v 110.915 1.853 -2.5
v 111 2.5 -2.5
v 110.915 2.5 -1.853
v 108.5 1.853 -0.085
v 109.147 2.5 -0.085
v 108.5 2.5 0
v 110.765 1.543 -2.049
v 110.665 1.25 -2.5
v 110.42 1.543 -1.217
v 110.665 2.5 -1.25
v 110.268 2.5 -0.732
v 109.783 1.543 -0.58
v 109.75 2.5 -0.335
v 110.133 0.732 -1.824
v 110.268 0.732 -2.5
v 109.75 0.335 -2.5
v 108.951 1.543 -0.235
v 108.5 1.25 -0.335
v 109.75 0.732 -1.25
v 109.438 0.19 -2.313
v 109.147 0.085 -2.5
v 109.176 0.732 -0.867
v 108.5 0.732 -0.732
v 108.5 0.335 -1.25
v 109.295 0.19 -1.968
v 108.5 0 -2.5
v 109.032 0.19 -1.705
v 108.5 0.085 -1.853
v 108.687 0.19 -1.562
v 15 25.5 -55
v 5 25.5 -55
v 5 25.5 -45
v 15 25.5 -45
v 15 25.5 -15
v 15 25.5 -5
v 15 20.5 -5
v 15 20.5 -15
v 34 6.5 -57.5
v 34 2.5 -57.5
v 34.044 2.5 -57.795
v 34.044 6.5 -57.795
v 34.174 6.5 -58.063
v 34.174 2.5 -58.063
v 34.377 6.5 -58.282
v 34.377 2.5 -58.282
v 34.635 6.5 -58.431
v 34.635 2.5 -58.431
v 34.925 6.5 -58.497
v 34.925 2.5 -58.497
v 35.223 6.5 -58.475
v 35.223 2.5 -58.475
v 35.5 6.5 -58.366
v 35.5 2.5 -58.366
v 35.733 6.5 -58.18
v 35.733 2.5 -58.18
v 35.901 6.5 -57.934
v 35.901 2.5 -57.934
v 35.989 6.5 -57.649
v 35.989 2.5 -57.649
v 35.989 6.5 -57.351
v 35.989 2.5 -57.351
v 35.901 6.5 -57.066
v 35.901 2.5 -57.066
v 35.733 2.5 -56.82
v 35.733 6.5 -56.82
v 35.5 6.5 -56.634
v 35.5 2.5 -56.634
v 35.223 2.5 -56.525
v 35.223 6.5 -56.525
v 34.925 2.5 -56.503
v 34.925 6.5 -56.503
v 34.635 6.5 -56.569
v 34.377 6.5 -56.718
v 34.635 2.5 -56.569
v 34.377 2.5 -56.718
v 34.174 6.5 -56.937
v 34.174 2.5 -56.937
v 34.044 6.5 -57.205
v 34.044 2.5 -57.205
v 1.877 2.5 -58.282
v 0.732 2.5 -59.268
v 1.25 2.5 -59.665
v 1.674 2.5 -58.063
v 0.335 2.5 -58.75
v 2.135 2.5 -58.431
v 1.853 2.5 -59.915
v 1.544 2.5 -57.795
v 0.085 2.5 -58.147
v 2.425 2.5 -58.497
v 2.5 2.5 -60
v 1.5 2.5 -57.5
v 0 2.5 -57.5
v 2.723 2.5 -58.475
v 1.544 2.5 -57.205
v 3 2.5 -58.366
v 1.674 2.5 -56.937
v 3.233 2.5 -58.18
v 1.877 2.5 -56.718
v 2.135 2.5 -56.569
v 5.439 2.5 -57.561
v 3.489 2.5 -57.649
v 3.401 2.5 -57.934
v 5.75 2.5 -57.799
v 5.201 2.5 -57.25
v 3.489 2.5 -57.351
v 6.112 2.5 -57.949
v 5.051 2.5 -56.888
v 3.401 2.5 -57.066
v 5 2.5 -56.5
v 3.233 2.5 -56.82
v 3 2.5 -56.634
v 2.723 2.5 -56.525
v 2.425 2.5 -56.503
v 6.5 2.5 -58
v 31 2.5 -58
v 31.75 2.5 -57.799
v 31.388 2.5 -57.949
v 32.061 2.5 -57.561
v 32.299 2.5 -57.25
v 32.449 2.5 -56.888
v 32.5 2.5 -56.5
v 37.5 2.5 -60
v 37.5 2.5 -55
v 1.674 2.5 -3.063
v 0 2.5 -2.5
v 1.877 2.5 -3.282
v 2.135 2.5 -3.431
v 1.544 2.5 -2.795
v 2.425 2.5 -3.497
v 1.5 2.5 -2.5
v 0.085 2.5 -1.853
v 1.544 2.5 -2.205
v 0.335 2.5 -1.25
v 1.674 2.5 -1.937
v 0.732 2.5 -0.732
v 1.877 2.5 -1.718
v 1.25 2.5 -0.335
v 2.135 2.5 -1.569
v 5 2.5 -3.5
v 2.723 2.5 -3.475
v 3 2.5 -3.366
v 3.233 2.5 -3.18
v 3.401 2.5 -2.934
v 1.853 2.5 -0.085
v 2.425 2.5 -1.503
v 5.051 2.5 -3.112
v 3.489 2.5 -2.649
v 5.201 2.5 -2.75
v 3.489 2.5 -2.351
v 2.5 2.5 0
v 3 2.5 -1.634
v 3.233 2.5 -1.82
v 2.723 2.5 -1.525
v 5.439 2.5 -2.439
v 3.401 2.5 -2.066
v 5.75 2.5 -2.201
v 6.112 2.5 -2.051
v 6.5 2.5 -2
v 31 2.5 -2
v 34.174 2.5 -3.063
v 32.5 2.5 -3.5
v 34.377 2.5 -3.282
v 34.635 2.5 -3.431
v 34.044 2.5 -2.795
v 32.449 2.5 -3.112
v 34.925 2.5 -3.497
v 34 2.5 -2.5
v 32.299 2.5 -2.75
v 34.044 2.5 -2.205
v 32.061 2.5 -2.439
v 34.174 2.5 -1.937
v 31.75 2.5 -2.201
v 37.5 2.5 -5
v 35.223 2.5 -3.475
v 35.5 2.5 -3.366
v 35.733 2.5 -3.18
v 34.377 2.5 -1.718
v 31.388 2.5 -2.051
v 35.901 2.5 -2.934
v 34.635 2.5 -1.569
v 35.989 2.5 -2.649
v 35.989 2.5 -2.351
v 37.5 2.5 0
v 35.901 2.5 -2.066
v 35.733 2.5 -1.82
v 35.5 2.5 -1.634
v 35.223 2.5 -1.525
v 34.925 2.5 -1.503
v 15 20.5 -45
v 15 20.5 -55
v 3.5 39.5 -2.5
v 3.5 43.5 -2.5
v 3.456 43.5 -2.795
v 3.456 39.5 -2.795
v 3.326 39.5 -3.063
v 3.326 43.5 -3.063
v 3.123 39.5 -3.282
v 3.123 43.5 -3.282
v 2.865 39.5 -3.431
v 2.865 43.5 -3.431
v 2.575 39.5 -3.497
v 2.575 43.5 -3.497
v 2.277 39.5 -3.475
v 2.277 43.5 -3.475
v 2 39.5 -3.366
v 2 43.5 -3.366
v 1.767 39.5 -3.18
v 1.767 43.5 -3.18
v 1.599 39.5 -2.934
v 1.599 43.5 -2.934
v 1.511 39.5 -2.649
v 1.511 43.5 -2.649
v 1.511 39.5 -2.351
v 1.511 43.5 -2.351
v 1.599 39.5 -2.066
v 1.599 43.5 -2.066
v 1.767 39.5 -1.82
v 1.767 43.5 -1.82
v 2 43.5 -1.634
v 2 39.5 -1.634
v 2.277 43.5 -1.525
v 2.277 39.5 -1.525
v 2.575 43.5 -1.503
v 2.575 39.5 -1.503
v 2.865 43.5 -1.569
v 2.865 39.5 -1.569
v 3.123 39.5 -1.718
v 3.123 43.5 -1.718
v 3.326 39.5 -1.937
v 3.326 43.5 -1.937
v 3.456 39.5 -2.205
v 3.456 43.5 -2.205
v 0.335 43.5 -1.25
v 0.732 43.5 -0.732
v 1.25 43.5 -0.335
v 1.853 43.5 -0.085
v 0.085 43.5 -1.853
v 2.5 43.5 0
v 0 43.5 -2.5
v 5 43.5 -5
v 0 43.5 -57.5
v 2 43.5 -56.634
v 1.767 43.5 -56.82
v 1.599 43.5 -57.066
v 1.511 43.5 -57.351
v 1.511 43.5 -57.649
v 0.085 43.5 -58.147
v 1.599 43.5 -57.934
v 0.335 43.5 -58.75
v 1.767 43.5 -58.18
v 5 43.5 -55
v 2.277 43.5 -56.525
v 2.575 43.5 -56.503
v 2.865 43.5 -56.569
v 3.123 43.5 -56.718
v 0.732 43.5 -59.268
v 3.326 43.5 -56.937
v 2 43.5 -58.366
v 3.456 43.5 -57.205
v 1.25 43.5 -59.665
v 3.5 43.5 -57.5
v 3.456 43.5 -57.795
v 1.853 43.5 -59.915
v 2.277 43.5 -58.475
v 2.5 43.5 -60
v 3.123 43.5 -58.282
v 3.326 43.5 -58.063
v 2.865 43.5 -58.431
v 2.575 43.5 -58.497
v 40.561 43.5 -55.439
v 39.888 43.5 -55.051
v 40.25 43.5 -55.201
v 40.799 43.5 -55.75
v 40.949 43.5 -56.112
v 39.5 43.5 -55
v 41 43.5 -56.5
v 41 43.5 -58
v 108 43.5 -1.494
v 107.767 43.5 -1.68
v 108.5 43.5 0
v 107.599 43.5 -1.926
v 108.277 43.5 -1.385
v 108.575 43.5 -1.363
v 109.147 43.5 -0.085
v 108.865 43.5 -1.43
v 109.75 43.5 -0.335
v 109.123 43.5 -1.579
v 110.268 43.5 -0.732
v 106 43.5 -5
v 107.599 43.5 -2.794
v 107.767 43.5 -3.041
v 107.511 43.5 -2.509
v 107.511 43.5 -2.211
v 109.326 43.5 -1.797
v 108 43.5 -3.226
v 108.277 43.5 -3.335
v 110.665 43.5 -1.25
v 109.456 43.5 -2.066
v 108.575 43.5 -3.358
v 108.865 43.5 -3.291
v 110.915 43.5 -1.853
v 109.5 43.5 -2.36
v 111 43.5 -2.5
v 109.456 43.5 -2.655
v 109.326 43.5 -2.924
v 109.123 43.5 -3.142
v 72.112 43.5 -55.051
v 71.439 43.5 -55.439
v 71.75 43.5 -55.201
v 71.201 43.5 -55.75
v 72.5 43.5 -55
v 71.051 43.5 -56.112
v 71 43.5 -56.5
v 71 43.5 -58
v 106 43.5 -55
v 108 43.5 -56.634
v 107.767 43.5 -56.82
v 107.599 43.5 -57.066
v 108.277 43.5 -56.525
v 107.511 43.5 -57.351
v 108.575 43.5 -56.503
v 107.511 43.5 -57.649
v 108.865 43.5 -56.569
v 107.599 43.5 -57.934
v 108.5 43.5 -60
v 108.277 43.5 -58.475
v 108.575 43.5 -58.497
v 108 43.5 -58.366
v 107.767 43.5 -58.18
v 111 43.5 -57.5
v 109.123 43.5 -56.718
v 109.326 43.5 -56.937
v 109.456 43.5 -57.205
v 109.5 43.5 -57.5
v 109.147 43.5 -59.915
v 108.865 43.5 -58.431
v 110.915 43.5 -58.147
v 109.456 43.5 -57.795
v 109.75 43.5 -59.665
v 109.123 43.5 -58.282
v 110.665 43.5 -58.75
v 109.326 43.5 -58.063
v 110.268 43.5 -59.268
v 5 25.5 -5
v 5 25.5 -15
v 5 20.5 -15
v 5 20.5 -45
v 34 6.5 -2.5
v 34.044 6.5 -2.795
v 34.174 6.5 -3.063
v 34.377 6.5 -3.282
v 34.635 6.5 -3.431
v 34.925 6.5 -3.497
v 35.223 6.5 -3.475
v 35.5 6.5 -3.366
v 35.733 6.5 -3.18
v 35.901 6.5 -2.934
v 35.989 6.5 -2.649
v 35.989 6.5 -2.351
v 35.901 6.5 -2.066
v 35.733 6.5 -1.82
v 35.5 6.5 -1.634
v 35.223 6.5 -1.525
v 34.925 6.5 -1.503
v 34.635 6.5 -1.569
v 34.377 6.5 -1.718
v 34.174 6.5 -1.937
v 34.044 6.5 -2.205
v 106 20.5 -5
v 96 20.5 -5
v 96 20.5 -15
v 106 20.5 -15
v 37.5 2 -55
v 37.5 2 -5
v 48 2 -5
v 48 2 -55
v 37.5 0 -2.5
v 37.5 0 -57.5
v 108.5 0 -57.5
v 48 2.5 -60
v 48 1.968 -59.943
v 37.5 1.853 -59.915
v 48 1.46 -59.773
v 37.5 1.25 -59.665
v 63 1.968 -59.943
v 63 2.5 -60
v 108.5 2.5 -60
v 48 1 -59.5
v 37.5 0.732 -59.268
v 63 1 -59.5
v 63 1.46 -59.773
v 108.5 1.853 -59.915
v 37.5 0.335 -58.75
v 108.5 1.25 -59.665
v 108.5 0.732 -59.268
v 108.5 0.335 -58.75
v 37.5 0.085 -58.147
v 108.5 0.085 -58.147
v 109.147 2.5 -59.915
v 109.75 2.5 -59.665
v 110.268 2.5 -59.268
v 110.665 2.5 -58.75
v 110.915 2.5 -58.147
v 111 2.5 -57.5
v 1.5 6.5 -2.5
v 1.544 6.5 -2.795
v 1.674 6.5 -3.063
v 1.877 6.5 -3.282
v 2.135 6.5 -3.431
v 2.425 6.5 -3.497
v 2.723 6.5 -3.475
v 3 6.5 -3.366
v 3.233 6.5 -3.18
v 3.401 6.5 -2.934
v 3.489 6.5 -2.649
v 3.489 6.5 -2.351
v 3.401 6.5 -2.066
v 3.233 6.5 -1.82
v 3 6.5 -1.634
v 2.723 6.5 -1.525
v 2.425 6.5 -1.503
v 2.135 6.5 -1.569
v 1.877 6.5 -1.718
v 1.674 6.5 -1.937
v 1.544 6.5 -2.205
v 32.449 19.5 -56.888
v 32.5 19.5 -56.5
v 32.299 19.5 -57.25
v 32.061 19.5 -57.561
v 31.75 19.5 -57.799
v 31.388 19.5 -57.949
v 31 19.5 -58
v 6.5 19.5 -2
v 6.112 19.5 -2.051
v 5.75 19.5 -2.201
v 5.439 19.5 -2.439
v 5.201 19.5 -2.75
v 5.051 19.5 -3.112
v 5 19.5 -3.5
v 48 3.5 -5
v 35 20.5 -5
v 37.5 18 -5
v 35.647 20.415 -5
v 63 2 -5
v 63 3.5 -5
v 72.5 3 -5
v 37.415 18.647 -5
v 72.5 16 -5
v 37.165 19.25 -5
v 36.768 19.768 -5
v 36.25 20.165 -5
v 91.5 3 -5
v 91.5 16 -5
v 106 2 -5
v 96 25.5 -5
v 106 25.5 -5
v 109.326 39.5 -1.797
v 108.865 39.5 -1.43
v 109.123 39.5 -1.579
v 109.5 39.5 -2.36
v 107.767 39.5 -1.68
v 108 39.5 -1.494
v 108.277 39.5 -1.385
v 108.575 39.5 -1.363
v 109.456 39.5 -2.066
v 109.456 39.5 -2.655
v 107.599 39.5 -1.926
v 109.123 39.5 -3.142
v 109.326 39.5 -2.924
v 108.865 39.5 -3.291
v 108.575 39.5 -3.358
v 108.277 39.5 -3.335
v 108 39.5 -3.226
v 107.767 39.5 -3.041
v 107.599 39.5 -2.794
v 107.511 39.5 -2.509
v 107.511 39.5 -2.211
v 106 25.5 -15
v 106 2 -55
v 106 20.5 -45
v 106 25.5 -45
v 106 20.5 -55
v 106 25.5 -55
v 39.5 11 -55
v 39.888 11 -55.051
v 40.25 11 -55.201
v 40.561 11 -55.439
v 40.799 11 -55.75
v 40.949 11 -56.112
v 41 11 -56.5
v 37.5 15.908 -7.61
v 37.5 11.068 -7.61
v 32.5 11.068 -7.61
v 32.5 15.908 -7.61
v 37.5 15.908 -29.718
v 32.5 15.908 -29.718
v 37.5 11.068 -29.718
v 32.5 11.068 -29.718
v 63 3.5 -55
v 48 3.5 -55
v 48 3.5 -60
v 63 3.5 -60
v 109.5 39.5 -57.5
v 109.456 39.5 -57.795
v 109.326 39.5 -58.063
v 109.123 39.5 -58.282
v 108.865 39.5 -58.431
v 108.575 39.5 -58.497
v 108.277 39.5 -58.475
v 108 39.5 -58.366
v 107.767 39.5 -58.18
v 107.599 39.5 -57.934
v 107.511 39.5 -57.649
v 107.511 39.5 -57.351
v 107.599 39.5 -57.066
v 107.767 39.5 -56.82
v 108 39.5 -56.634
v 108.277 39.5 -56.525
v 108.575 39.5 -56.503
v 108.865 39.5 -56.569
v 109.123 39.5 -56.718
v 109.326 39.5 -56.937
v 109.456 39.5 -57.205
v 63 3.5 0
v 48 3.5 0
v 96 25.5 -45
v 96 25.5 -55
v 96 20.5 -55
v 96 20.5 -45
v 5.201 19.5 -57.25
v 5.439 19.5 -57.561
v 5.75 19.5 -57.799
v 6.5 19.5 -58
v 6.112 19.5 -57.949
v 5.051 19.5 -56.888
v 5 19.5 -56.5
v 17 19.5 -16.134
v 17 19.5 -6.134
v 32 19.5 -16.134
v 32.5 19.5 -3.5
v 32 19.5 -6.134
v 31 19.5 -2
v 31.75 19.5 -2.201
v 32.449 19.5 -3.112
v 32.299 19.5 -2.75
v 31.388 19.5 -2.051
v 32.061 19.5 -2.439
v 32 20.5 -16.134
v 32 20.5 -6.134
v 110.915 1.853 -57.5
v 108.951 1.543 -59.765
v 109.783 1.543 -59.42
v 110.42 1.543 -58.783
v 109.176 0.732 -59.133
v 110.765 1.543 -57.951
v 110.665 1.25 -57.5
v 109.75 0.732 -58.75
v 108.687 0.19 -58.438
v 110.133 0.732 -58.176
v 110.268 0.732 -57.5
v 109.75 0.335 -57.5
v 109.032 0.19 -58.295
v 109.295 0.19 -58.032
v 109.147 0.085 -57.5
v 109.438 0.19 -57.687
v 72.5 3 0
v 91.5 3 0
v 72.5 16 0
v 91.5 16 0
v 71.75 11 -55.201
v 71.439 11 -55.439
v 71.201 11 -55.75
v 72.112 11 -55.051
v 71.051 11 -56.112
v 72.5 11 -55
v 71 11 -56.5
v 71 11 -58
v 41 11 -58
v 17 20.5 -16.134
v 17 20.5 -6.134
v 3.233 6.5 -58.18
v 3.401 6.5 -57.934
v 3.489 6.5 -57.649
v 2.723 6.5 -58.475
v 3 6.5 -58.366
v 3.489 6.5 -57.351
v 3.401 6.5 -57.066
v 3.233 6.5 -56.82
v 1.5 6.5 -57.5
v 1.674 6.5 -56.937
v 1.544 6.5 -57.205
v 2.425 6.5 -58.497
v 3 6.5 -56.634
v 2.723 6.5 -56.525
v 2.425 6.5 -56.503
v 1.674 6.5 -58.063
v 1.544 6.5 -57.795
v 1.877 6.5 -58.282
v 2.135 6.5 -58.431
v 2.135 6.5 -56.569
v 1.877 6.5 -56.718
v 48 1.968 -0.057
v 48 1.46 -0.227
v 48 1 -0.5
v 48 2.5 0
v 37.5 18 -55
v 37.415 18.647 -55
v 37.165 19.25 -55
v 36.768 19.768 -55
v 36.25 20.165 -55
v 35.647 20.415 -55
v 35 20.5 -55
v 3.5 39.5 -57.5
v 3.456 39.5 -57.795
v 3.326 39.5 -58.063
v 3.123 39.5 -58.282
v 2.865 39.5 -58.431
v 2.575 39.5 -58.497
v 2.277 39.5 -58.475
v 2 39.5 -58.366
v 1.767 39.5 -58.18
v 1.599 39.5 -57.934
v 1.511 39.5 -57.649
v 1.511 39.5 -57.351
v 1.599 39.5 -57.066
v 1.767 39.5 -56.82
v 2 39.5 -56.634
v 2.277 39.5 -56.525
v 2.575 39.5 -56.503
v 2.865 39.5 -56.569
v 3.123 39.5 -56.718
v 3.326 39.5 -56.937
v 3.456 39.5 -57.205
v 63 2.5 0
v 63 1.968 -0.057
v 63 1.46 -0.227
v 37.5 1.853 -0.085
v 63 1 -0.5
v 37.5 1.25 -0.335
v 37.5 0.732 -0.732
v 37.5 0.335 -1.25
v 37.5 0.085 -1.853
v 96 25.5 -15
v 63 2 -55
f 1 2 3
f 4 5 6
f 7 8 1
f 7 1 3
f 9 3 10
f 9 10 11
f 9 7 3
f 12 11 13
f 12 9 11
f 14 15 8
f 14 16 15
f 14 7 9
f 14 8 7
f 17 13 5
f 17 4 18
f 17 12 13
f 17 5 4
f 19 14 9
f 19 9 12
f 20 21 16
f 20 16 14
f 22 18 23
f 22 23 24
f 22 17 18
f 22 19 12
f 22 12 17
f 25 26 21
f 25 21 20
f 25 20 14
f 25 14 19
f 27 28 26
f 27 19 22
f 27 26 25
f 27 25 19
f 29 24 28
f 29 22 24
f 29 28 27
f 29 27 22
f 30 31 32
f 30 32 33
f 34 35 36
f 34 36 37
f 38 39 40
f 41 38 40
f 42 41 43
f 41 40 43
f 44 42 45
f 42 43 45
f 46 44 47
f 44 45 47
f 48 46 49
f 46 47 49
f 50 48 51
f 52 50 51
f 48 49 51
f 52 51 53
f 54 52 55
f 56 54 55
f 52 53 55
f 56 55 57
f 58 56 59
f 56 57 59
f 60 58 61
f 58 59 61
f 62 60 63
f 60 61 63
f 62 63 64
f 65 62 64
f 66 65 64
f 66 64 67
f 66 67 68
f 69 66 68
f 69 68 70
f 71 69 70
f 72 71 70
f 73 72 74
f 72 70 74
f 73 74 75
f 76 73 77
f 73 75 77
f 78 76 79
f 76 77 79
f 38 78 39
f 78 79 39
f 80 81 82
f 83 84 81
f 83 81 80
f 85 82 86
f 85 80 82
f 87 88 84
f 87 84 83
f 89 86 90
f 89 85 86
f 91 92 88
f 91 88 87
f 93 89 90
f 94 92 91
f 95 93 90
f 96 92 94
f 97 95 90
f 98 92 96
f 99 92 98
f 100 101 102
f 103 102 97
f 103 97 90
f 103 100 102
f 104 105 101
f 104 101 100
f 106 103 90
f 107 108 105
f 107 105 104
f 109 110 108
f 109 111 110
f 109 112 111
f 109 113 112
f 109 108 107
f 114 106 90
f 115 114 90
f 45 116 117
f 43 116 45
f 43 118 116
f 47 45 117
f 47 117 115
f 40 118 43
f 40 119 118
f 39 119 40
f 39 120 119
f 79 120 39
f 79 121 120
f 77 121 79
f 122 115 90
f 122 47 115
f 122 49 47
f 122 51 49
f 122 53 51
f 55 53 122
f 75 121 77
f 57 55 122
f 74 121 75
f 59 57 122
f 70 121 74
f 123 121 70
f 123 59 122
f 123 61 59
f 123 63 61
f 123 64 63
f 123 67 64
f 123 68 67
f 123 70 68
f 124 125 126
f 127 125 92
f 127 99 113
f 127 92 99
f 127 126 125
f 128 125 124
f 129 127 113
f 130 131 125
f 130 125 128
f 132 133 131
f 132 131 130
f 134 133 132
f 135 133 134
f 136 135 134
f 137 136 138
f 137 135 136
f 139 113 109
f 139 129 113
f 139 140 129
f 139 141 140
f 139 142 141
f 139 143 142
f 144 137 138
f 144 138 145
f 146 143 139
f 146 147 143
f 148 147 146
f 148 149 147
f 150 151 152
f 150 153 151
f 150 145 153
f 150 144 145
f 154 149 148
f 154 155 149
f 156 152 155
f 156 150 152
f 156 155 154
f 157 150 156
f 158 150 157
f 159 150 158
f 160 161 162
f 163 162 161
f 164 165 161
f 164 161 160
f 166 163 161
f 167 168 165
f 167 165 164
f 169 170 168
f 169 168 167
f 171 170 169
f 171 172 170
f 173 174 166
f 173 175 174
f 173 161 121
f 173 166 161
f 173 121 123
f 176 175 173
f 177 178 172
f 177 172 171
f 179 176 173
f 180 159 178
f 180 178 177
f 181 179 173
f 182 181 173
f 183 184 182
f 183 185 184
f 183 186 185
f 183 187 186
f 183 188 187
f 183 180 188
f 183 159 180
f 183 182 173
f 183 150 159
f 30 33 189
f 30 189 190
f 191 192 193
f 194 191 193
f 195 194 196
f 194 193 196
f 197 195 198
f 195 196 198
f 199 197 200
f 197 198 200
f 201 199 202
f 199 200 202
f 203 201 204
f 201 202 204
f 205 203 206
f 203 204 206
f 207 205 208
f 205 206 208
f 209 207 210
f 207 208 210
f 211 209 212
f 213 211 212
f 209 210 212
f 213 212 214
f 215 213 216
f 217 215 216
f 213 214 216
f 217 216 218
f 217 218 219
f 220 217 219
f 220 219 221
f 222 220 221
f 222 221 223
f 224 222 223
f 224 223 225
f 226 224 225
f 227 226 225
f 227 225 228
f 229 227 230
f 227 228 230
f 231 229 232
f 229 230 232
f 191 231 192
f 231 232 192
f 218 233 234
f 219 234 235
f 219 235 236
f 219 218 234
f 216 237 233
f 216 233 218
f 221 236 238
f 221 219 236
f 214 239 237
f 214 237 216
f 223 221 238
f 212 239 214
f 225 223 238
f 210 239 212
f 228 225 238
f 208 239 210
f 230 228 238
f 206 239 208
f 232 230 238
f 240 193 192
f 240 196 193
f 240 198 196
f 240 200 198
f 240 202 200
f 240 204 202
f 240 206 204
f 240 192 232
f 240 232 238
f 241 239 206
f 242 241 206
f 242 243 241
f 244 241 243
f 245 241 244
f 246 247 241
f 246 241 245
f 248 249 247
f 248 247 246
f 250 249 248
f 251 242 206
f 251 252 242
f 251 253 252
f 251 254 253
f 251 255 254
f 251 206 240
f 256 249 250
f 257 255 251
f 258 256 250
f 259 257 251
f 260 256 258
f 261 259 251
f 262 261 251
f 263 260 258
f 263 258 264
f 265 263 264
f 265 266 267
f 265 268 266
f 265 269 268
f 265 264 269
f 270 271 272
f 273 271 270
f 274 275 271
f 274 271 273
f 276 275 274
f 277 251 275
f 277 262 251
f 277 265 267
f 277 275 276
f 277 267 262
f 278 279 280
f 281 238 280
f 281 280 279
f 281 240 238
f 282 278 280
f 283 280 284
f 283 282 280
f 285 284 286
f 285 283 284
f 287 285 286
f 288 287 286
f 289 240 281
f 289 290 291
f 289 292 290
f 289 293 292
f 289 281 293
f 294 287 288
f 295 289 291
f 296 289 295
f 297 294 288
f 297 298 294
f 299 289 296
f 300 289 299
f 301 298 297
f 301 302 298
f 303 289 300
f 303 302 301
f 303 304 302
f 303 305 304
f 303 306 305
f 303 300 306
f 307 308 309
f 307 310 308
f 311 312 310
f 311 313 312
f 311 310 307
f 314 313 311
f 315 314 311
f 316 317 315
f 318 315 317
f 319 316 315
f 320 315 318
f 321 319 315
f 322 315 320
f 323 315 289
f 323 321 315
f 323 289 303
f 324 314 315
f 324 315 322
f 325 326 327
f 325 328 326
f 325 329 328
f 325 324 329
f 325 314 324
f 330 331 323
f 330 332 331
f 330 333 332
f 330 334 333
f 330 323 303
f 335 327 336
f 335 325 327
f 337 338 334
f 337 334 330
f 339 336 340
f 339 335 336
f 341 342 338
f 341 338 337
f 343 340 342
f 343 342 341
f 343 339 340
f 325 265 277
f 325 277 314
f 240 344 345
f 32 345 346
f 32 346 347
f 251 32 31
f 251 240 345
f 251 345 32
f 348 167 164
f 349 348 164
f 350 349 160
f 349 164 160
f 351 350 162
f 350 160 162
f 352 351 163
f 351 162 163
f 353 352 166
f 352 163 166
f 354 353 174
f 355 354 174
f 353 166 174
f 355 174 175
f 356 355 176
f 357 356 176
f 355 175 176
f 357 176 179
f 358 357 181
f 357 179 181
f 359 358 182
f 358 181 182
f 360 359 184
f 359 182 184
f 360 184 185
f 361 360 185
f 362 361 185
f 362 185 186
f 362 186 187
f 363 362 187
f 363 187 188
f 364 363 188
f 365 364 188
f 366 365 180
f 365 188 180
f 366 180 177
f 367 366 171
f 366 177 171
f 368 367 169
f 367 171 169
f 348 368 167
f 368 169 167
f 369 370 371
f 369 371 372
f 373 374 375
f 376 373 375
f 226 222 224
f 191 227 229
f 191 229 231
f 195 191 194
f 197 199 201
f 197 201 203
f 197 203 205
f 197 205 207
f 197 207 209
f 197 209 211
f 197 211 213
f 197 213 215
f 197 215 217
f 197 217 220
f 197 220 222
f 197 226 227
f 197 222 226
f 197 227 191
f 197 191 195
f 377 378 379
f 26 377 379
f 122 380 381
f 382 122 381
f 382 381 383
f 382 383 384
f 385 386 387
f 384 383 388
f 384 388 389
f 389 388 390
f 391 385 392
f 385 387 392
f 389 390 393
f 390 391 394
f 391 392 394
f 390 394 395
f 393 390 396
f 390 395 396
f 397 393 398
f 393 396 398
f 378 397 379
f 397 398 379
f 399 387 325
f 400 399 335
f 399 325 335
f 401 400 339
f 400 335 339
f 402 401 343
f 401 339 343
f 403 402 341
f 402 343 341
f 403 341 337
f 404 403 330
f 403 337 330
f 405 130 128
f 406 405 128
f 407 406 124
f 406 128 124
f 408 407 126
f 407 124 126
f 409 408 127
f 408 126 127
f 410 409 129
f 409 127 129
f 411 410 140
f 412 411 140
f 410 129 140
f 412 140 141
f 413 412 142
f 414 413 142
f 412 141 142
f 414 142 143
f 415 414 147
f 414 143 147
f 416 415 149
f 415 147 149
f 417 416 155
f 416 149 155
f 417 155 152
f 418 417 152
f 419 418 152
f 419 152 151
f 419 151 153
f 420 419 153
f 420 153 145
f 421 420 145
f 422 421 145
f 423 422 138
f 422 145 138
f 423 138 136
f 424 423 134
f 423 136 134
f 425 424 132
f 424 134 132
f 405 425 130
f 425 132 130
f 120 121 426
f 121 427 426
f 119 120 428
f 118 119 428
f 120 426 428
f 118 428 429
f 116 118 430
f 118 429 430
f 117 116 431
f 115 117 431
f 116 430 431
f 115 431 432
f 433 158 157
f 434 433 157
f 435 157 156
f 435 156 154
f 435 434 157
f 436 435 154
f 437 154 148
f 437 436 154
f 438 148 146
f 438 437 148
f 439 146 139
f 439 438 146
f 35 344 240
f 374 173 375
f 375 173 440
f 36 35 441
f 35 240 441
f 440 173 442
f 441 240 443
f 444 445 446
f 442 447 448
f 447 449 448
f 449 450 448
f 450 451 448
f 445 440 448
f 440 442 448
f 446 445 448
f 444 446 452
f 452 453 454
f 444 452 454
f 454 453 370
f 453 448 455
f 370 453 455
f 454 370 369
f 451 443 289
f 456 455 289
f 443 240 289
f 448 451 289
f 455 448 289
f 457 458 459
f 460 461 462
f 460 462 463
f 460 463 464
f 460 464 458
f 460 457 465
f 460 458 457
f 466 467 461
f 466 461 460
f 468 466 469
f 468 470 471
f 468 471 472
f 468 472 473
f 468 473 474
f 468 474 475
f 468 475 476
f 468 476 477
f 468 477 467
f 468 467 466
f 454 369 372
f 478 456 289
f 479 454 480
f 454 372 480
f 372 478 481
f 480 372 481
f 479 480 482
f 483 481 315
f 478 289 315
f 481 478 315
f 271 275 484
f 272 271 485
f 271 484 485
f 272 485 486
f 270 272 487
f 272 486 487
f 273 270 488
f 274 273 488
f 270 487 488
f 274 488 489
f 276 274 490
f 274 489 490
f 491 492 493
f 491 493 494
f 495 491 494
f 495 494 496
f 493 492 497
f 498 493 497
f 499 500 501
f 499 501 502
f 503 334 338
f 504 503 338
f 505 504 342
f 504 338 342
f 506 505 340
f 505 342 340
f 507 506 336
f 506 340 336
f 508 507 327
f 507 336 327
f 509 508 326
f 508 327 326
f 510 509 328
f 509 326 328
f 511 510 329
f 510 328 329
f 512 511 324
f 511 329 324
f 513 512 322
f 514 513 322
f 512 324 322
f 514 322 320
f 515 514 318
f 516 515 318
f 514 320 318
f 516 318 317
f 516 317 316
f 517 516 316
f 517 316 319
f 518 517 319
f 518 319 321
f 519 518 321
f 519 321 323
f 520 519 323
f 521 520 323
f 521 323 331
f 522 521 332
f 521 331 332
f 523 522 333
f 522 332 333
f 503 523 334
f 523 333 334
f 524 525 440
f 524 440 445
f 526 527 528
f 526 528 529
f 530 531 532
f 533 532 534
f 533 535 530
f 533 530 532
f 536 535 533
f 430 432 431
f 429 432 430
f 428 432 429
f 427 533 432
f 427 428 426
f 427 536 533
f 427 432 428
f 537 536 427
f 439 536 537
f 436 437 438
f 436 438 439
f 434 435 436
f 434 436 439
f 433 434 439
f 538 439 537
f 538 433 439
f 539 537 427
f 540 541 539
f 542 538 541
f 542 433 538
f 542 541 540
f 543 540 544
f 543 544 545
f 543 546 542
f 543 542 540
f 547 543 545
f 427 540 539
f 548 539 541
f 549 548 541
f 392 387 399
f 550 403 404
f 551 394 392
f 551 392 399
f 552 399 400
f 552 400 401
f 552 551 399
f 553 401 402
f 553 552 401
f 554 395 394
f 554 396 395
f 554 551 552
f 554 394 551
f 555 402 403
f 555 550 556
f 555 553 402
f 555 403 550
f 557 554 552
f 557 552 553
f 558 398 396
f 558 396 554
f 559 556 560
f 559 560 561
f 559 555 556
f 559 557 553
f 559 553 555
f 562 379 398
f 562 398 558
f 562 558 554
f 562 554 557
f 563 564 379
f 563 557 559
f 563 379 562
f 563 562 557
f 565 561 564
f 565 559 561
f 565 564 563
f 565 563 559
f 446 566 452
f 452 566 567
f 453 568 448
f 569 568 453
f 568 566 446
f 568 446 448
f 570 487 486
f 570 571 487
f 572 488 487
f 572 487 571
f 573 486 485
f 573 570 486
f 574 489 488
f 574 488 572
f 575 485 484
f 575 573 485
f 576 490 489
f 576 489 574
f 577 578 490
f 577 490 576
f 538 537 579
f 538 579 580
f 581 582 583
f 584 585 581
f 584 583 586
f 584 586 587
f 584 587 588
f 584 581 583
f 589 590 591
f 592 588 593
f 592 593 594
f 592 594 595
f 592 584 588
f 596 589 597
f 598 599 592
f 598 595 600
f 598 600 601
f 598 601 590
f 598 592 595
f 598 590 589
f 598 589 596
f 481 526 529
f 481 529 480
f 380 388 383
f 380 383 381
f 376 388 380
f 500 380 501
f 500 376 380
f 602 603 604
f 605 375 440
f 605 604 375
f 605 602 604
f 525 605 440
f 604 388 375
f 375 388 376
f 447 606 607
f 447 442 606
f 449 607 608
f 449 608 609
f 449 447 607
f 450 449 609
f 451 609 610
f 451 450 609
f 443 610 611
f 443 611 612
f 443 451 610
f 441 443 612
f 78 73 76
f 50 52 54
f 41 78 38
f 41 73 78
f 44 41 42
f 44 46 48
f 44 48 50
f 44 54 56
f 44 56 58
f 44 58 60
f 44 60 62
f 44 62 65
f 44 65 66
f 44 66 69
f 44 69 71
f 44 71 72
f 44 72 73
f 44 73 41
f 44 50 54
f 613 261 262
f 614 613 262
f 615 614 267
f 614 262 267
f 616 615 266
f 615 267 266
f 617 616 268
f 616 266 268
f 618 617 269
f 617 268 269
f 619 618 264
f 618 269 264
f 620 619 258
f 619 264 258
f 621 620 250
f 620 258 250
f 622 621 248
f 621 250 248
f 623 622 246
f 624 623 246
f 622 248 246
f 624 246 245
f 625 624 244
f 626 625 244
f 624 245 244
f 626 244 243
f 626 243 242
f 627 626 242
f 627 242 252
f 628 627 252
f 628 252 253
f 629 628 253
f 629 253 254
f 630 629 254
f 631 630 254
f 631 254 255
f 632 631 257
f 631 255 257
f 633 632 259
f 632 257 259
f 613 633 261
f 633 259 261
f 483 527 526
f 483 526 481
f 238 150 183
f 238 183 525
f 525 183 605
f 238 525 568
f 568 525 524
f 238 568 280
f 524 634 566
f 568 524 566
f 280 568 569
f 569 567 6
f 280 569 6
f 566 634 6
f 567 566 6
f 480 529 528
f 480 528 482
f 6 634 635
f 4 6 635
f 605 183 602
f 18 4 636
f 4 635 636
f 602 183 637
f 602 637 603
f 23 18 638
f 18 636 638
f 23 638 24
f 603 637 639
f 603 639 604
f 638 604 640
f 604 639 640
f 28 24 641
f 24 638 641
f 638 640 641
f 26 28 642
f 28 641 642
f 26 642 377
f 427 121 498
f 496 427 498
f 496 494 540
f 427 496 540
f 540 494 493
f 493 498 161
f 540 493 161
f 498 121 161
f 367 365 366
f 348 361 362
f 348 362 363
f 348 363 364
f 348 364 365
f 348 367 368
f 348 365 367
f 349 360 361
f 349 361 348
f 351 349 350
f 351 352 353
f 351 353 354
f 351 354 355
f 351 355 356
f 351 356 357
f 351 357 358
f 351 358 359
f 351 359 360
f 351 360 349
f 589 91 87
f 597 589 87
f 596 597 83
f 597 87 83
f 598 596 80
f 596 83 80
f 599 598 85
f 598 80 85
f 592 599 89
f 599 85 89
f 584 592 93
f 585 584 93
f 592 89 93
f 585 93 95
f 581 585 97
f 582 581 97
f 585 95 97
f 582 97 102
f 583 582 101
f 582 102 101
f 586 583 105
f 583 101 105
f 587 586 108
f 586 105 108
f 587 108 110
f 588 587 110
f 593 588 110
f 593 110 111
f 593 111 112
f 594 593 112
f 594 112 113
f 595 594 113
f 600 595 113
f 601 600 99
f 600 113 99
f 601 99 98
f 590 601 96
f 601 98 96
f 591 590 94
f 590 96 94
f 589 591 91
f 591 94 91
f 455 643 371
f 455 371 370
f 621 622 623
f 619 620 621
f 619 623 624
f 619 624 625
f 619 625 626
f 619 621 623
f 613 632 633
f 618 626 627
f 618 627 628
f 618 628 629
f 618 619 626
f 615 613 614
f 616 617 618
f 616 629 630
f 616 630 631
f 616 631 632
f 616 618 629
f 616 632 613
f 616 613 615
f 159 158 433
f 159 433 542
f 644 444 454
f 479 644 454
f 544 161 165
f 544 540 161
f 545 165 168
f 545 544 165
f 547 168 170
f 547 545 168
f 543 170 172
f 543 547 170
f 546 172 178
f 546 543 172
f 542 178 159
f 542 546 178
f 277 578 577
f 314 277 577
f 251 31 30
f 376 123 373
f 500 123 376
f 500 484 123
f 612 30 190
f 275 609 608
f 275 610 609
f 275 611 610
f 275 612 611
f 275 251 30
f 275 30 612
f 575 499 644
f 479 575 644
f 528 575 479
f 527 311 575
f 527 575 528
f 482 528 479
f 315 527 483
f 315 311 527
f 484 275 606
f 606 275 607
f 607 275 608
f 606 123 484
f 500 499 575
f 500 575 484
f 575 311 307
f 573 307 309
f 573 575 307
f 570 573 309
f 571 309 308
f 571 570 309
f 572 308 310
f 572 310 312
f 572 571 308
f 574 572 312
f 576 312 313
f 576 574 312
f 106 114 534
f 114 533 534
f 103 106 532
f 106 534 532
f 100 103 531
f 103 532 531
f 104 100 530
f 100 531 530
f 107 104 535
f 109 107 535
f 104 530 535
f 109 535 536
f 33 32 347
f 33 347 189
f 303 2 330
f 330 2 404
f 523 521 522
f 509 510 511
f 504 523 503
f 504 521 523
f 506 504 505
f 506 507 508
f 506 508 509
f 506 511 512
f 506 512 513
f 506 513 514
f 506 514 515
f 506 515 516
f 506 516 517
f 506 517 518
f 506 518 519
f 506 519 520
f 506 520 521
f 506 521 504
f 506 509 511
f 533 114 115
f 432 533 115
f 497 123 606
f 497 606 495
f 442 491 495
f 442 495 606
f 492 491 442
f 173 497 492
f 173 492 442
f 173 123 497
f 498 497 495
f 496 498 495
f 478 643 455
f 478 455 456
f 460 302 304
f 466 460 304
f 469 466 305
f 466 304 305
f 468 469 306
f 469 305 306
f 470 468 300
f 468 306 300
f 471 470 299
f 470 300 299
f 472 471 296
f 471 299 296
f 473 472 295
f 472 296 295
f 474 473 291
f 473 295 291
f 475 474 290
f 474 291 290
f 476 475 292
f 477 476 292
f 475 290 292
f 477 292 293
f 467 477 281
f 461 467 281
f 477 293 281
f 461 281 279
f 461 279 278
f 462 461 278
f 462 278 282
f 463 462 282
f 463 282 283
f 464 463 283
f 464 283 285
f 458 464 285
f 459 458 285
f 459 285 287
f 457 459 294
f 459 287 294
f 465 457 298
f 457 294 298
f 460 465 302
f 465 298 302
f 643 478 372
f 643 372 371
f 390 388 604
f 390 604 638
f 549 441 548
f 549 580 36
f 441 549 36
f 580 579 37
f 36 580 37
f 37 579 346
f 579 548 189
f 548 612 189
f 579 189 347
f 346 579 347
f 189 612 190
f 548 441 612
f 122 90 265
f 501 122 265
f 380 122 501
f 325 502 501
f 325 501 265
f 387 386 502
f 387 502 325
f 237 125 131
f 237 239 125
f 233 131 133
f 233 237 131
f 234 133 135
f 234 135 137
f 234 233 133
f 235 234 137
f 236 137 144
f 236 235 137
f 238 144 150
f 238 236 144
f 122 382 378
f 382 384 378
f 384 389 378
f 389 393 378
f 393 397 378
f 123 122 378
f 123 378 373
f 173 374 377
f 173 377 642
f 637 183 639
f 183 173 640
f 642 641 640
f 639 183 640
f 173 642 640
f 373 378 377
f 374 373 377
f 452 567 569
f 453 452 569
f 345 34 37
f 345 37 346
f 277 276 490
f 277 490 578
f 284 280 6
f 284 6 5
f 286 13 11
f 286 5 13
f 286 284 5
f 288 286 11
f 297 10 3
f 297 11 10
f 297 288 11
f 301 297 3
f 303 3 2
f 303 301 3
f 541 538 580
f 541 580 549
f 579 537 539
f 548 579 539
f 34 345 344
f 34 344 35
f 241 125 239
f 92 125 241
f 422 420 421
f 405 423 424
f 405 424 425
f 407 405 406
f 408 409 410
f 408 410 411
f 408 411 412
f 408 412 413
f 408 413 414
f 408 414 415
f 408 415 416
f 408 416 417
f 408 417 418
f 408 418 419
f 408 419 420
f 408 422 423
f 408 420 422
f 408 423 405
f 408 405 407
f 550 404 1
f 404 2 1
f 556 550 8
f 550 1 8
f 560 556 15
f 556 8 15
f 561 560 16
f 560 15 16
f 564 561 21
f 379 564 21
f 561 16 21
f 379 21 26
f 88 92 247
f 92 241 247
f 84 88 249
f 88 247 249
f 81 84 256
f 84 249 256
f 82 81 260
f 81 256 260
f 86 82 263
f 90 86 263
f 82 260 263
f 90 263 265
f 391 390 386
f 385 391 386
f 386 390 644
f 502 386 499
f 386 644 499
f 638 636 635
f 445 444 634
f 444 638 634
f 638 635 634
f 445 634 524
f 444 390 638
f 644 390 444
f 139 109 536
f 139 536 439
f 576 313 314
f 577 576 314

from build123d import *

# Parameters (mm, degrees)
SKETCH1_W           = 111
SKETCH1_H           = 60
BOSS_EXTRUDE1_DEPTH = 43.5
SKETCH2_W           = 101
SKETCH2_H           = 50
CUT_EXTRUDE1_DEPTH  = 18
CUT_EXTRUDE3_DEPTH  = 23
CUT_EXTRUDE5_START  = -2
SKETCH5_W           = 68.5
SKETCH5_H           = 50
CUT_EXTRUDE5_DEPTH  = 18.5
SKETCH6_W           = 37.5
SKETCH6_H           = 60
CUT_EXTRUDE6_DEPTH  = 2.5
SKETCH7_R           = 1
CUT_EXTRUDE7_DEPTH  = 4
SKETCH8_R           = 1
CUT_EXTRUDE8_DEPTH  = 4
SKETCH9_W           = 19
SKETCH9_H           = 13
CUT_EXTRUDE9_DEPTH  = 10
SKETCH12_W          = 30
SKETCH12_H          = 3
CUT_EXTRUDE12_DEPTH = 32.5
FILLET2_R           = 2.5
FILLET3_R           = 2.5
FILLET4_R           = 2.5
FILLET5_R           = 2.5
FILLET6_R           = 2.5
SKETCH13_W          = 27.5
SKETCH13_H          = 56
CUT_EXTRUDE13_DEPTH = 17
SKETCH14_W          = 15
SKETCH14_H          = 10
CUT_EXTRUDE14_DEPTH = 25
FILLET7_R           = 1.5
FILLET8_R           = 1.5
FILLET9_R           = 1.5
FILLET10_R          = 1.5
FILLET11_R          = 2.5
FILLET12_R          = 1.5
SKETCH15_W          = 22.107435613
SKETCH15_H          = 4.839639835
CUT_EXTRUDE15_DEPTH = 10
SKETCH16_W          = 15
SKETCH16_H          = 2.5
CUT_EXTRUDE16_DEPTH = 61


with BuildPart() as part:
    # Sketch1 → Boss-Extrude1 (new body)
    with BuildSketch(Plane(origin=(0, 0, 0), x_dir=(1, 0, 0), z_dir=(0, 1, 0))):
        with Locations((55.5, 30)):
            Rectangle(SKETCH1_W, SKETCH1_H)
    extrude(amount=BOSS_EXTRUDE1_DEPTH)

    # Sketch2 → Cut-Extrude1 (cut)
    with BuildSketch(Plane(origin=(0, 43.5, 0), x_dir=(1, 0, 0), z_dir=(0, 1, 0))):
        with Locations((55.5, 30)):
            Rectangle(SKETCH2_W, SKETCH2_H)
    extrude(amount=-CUT_EXTRUDE1_DEPTH, mode=Mode.SUBTRACT)

    # Sketch3 → Cut-Extrude3 (cut)
    with BuildSketch(Plane(origin=(0, 43.5, 0), x_dir=(1, 0, 0), z_dir=(0, 1, 0))):
        Polygon((5, 45), (15, 45), (15, 55), (96, 55), (96, 45), (106, 45), (106, 15), (96, 15), (96, 5), (15, 5), (15, 15), (5, 15), align=None)
    extrude(amount=-CUT_EXTRUDE3_DEPTH, mode=Mode.SUBTRACT)

    # Sketch5 → Cut-Extrude5 (cut)
    with BuildSketch(Plane.XZ.offset(CUT_EXTRUDE5_START)):
        with Locations((71.75, -30)):
            Rectangle(SKETCH5_W, SKETCH5_H)
    extrude(amount=-CUT_EXTRUDE5_DEPTH, mode=Mode.SUBTRACT)

    # Sketch6 → Cut-Extrude6 (cut)
    with BuildSketch(Plane.XZ):
        with Locations((18.75, -30)):
            Rectangle(SKETCH6_W, SKETCH6_H)
    extrude(amount=-CUT_EXTRUDE6_DEPTH, mode=Mode.SUBTRACT)

    # Sketch7 → Cut-Extrude7 (cut)
    with BuildSketch(Plane(origin=(0, 2.5, 0), x_dir=(-1, 0, 0), z_dir=(0, -1, 0))):
        with Locations((-2.5, 57.5)):
            Circle(SKETCH7_R)
        with Locations((-35, 57.5)):
            Circle(SKETCH7_R)
        with Locations((-35, 2.5)):
            Circle(SKETCH7_R)
        with Locations((-2.5, 2.5)):
            Circle(SKETCH7_R)
    extrude(amount=-CUT_EXTRUDE7_DEPTH, mode=Mode.SUBTRACT)

    # Sketch8 → Cut-Extrude8 (cut)
    with BuildSketch(Plane(origin=(0, 43.5, 0), x_dir=(1, 0, 0), z_dir=(0, 1, 0))):
        with Locations((2.5, 57.5)):
            Circle(SKETCH8_R)
        with Locations((108.5, 57.5)):
            Circle(SKETCH8_R)
        with Locations((108.5, 2.360383006)):
            Circle(SKETCH8_R)
        with Locations((2.5, 2.5)):
            Circle(SKETCH8_R)
    extrude(amount=-CUT_EXTRUDE8_DEPTH, mode=Mode.SUBTRACT)

    # Sketch9 → Cut-Extrude9 (cut)
    with BuildSketch(Plane.XY):
        with Locations((82, 9.5)):
            Rectangle(SKETCH9_W, SKETCH9_H)
    extrude(amount=-CUT_EXTRUDE9_DEPTH, mode=Mode.SUBTRACT)

    # Sketch12 → Cut-Extrude12 (cut)
    with BuildSketch(Plane(origin=(0, 43.5, 0), x_dir=(1, 0, 0), z_dir=(0, 1, 0))):
        with Locations((56, 56.5)):
            Rectangle(SKETCH12_W, SKETCH12_H)
    extrude(amount=-CUT_EXTRUDE12_DEPTH, mode=Mode.SUBTRACT)

    # Fillet2
    fillet2_edges = [part.edges().sort_by_distance(p)[0] for p in [
        (0, 23, 0),
    ]]
    fillet(fillet2_edges, radius=FILLET2_R)

    # Fillet3
    fillet3_edges = [part.edges().sort_by_distance(p)[0] for p in [
        (111, 21.75, 0),
    ]]
    fillet(fillet3_edges, radius=FILLET3_R)

    # Fillet4
    fillet4_edges = [part.edges().sort_by_distance(p)[0] for p in [
        (0, 23, -60),
    ]]
    fillet(fillet4_edges, radius=FILLET4_R)

    # Fillet5
    fillet5_edges = [part.edges().sort_by_distance(p)[0] for p in [
        (111, 21.75, -60),
    ]]
    fillet(fillet5_edges, radius=FILLET5_R)

    # Fillet6
    fillet6_edges = [part.edges().sort_by_distance(p)[0] for p in [
        (73, 0, -60),
        (110.267766953, 0, -59.267766953),
        (111, 0, -30),
        (110.267766953, 0, -0.732233047),
        (73, 0, 0),
    ]]
    fillet(fillet6_edges, radius=FILLET6_R)

    # Sketch13 → Cut-Extrude13 (cut)
    with BuildSketch(Plane.XZ.offset(-2.5)):
        with Locations((18.75, -30)):
            Rectangle(SKETCH13_W, SKETCH13_H)
    extrude(amount=-CUT_EXTRUDE13_DEPTH, mode=Mode.SUBTRACT)

    # Sketch14 → Cut-Extrude14 (cut, through all)
    with BuildSketch(Plane.XZ.offset(-19.5)):
        with Locations((24.5, -11.134142308)):
            Rectangle(SKETCH14_W, SKETCH14_H)
    extrude(amount=-CUT_EXTRUDE14_DEPTH, mode=Mode.SUBTRACT)

    # Fillet7
    fillet7_edges = [part.edges().sort_by_distance(p)[0] for p in [
        (32.5, 11, -2),
    ]]
    fillet(fillet7_edges, radius=FILLET7_R)

    # Fillet8
    fillet8_edges = [part.edges().sort_by_distance(p)[0] for p in [
        (5, 11, -2),
    ]]
    fillet(fillet8_edges, radius=FILLET8_R)

    # Fillet9
    fillet9_edges = [part.edges().sort_by_distance(p)[0] for p in [
        (32.5, 11, -58),
    ]]
    fillet(fillet9_edges, radius=FILLET9_R)

    # Fillet10
    fillet10_edges = [part.edges().sort_by_distance(p)[0] for p in [
        (5, 11, -58),
    ]]
    fillet(fillet10_edges, radius=FILLET10_R)

    # Fillet11
    fillet11_edges = [part.edges().sort_by_distance(p)[0] for p in [
        (37.5, 20.5, -30),
    ]]
    fillet(fillet11_edges, radius=FILLET11_R)

    # Fillet12
    fillet12_edges = [part.edges().sort_by_distance(p)[0] for p in [
        (71, 27.25, -55),
        (41, 27.25, -55),
    ]]
    fillet(fillet12_edges, radius=FILLET12_R)

    # Sketch15 → Cut-Extrude15 (cut)
    with BuildSketch(Plane(origin=(37.5, 0, 0), x_dir=(0, 0, -1), z_dir=(1, 0, 0))):
        with Locations((18.663805006, 13.487875839)):
            Rectangle(SKETCH15_W, SKETCH15_H)
    extrude(amount=-CUT_EXTRUDE15_DEPTH, mode=Mode.SUBTRACT)

    # Sketch16 → Cut-Extrude16 (cut, through all)
    with BuildSketch(Plane.XY):
        with Locations((55.5, 2.25)):
            Rectangle(SKETCH16_W, SKETCH16_H)
    extrude(amount=-CUT_EXTRUDE16_DEPTH, mode=Mode.SUBTRACT)


solid = part.part
